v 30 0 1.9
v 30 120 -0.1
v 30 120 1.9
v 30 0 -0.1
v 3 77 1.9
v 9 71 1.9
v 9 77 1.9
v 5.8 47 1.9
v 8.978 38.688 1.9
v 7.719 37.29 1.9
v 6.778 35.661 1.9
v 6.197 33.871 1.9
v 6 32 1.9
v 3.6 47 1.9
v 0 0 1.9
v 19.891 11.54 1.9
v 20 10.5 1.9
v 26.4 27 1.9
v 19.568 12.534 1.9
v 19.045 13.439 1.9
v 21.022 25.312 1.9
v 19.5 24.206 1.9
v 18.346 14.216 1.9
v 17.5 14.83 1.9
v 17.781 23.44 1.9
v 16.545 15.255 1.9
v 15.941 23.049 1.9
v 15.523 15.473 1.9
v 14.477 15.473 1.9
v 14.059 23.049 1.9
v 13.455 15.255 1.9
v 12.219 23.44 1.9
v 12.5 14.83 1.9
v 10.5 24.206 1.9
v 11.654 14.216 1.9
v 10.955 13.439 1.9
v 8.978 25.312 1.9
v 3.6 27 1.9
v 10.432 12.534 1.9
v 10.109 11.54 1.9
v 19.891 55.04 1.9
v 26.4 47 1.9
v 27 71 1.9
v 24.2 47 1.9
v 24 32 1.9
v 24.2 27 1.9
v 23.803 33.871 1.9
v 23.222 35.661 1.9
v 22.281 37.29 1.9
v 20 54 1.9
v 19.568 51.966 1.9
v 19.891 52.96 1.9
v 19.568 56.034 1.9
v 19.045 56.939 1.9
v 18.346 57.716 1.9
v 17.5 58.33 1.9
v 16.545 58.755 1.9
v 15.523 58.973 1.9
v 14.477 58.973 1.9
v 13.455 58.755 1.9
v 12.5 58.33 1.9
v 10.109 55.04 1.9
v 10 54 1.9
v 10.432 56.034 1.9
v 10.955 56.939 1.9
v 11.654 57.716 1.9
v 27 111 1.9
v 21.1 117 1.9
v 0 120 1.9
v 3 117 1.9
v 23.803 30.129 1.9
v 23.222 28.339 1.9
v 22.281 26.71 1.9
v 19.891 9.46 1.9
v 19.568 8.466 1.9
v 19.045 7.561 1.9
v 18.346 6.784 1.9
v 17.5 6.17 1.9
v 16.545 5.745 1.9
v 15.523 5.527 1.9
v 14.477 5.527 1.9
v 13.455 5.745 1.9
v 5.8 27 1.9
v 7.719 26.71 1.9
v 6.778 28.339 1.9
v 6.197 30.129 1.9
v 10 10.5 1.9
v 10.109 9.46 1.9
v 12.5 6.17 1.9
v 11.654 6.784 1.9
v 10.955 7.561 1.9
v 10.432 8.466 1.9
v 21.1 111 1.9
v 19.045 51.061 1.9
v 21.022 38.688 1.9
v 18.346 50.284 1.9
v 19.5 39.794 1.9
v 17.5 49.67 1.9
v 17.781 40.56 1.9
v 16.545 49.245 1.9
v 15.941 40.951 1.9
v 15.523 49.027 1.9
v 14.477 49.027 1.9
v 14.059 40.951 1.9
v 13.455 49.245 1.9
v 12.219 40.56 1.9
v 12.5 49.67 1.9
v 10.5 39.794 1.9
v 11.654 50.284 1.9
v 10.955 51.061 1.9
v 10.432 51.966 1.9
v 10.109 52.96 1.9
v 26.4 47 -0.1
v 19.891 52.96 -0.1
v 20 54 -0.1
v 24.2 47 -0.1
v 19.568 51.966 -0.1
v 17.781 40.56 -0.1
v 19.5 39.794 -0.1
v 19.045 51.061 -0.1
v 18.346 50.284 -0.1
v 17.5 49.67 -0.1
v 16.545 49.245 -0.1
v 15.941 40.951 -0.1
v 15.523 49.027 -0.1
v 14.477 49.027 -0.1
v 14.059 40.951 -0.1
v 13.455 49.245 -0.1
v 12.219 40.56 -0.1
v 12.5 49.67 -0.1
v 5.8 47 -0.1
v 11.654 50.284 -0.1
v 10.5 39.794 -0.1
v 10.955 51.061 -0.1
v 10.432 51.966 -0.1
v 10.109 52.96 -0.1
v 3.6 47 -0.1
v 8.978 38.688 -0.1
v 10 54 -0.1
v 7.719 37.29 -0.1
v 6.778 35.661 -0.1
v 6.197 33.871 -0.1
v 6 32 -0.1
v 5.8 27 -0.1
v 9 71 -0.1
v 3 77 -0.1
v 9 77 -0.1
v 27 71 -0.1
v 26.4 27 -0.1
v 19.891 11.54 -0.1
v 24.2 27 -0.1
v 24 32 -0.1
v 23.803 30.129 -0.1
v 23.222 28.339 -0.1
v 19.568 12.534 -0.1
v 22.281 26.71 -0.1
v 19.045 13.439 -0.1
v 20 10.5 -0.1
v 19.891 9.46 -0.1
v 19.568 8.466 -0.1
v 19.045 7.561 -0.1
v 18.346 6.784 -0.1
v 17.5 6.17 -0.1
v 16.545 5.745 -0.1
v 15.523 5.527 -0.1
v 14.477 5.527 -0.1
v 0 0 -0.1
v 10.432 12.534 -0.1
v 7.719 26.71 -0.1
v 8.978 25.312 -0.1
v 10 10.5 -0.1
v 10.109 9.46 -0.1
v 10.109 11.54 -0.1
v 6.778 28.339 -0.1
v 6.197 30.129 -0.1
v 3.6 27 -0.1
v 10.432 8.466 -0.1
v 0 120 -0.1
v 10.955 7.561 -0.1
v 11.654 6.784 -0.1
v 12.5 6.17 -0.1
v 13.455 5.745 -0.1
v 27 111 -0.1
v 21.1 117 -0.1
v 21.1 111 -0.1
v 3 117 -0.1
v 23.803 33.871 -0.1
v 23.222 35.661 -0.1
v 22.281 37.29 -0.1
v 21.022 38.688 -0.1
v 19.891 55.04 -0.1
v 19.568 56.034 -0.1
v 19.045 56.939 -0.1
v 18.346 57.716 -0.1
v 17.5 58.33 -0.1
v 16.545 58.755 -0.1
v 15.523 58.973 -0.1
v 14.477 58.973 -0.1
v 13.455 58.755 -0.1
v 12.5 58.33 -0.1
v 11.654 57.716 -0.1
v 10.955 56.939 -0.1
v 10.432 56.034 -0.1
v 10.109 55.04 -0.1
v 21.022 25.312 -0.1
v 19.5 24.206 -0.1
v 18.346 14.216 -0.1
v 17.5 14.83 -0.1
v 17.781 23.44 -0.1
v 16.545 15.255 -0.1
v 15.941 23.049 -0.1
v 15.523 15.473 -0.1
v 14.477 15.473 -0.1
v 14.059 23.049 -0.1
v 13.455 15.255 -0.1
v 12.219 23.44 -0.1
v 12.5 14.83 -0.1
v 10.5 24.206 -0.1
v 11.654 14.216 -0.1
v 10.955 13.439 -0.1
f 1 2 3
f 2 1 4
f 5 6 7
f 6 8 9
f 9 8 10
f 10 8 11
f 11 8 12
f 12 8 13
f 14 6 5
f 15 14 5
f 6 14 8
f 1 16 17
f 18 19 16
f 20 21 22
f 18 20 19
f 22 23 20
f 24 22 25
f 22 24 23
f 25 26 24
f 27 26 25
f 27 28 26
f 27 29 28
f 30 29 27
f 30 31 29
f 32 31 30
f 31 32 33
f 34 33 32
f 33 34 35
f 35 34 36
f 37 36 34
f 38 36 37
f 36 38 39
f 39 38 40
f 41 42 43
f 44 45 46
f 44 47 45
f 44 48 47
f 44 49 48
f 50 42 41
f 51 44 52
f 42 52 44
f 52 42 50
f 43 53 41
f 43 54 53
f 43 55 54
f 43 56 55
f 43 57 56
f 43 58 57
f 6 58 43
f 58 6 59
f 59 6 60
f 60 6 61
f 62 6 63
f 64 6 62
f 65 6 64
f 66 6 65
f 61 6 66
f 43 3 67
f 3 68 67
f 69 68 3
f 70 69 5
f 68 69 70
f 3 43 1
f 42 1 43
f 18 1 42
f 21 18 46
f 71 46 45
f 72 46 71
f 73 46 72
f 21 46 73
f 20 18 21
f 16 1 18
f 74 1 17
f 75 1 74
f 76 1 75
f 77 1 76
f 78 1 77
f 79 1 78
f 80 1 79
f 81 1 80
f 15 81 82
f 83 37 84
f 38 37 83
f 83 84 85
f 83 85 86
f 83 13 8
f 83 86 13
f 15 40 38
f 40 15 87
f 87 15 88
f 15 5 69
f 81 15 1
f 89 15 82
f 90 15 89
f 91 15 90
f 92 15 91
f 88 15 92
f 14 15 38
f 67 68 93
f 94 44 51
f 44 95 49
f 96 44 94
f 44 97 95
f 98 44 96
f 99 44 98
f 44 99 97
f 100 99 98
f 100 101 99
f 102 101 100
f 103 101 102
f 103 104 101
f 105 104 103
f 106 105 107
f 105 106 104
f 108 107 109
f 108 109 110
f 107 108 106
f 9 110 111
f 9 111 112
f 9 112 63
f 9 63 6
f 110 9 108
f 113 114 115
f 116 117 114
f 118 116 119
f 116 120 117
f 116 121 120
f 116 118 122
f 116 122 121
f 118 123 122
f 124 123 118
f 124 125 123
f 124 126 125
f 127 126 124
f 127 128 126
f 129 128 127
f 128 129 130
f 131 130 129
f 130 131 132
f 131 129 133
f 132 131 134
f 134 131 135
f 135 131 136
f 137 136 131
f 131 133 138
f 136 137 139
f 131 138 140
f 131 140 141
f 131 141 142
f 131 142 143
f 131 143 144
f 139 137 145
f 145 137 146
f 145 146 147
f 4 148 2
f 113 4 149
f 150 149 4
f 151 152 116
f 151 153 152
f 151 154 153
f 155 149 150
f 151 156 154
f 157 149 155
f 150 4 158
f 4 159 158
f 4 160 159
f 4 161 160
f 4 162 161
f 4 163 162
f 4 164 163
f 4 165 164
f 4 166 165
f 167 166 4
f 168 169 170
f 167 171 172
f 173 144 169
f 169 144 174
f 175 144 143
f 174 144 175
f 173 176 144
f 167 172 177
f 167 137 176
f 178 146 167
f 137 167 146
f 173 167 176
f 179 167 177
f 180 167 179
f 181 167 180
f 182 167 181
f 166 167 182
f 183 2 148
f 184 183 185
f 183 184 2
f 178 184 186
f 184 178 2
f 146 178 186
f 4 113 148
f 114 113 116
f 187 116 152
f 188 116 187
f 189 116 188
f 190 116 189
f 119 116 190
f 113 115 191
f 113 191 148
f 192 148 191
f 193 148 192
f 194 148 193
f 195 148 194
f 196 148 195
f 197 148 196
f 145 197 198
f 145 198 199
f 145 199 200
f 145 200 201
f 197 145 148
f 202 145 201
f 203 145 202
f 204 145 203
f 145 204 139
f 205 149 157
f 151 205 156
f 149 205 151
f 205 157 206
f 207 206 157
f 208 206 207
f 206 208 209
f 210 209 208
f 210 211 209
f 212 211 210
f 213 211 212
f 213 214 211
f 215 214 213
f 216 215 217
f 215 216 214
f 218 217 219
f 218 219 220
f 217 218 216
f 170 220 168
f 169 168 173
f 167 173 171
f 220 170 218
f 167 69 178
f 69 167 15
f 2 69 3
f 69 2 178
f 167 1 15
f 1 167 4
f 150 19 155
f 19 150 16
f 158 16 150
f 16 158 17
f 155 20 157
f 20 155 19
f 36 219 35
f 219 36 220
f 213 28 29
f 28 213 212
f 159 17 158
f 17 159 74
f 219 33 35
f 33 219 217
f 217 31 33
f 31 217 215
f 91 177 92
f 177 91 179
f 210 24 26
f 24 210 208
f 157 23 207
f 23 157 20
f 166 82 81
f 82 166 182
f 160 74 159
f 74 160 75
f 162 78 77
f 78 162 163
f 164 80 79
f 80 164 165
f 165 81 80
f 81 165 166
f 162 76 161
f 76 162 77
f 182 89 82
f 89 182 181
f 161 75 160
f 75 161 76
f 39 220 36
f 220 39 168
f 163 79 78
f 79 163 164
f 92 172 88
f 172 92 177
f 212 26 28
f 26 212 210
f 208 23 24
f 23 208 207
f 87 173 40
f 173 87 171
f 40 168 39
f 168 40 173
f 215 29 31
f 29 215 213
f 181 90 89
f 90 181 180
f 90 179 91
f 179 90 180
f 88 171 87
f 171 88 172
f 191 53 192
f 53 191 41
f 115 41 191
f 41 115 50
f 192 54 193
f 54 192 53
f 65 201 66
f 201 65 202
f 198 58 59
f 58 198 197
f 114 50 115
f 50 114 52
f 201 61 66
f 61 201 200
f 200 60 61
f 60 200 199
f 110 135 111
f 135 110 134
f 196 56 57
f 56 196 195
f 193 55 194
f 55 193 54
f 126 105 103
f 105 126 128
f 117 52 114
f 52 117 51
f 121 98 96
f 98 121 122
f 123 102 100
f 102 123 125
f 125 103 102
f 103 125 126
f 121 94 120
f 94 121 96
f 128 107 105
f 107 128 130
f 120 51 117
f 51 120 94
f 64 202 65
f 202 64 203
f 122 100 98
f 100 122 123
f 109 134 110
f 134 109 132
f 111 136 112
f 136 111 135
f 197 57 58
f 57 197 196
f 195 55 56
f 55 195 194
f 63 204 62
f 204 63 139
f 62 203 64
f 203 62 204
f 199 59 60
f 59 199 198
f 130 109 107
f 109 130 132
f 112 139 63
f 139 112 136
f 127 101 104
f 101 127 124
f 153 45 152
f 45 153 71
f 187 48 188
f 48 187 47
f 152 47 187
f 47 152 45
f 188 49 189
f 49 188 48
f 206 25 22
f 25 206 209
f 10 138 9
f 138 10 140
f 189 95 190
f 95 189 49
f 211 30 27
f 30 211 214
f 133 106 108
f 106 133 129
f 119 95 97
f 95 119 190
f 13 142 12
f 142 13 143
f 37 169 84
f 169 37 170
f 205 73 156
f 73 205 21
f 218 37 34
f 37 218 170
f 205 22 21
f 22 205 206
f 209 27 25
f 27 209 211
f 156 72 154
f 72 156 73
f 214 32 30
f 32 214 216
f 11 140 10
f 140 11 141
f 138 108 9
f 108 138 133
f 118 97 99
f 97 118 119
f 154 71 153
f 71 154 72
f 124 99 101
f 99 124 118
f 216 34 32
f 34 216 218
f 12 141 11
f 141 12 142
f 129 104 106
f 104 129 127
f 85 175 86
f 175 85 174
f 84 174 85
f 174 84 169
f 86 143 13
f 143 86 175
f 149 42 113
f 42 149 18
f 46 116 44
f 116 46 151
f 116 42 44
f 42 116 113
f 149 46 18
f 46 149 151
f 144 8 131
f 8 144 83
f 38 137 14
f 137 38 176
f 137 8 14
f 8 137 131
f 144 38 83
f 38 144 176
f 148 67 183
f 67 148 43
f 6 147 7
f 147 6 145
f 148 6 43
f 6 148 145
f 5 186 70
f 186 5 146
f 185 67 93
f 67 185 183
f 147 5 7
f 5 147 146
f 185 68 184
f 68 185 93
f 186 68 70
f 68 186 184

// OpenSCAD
// variables
Grundplatte=1;
Grundplatte_Platinenaussparung=0;
Grundplatte_Kabelschacht=0;
Deckel=0;
Deckel_CR2032=0;

// Maße Grundplatte
pH=20;  // gesamt
kH=6;   // kabel

//
module roundedEdge(x=0, y=0, z=-1, a=0, l=30, h=pH+2, s=0) 
{
    fa=5;
    fs=0.1;

    translate([x, y, z]) rotate(a)
    difference() {
        translate([0, 0, 0])
        linear_extrude(h) 
        polygon([[-1, -1], [l/2, -1], [-1, l/2]]);
        if (s==0) {
            translate([l/2, l/2, 0]) cylinder(r=l/2, h=h+2, $fa = fa, $fs = fs);
        } else if (s==1)
        {
            translate([l/2, l/2, l/2]) cylinder(r=l/2, h=h+2, $fa = fa, $fs = fs);
            translate([l/2, l/2, l/2]) 
            sphere(r=l/2, $fa = fa, $fs = fs);
        } else if (s==2) {
            translate([l/2, l/2, 0]) cylinder(r=l/2, h=h+2-l/2, $fa = fa, $fs = fs);
            translate([l/2, l/2, h-l/2]) 
            sphere(r=l/2, $fa = fa, $fs = fs);
        } else {
            translate([l/2, l/2, l/2]) cylinder(r=l/2, h=h+2-l, $fa = fa, $fs = fs);
            translate([l/2, l/2, l/2]) 
            sphere(r=l/2, $fa = fa, $fs = fs);
            translate([l/2, l/2, h-l/2]) 
            sphere(r=l/2, $fa = fa, $fs = fs);
        }
    }
}

// Grundplatte
if (Grundplatte == 1) {
    scale([0.1, 0.1, 0.1])
    difference() {
    translate([0, 0, -1])
    cube([300, 1200, pH], center=false);

    // befestigung
    translate([150, 105, -1])
    cylinder(r=50, h=pH+2, center=false);
    translate([150, 540, -1])
    cylinder(r=50, h=pH+2, center=false);
    // vierkant
    translate([150, 320, -1])
    cylinder(r=90, h=pH+2, center=false);
    // reed
    translate([242, 270, -1])
    cube([22, 200, pH+2], center=false);
    translate([36, 270, -1])
    cube([22, 200, pH+2], center=false);

    // platine
    if (Grundplatte_Platinenaussparung == 1) {
        translate([30, 710, 14])
        cube([61, 61, 7], center=false);
        translate([50, 730, 6])
        cube([41, 41, 15], center=false);
    }
    translate([90, 710, -1])
    cube([180, 61, pH+2], center=false);

    translate([30, 770, -1])
    cube([240, 340, pH+2], center=false);

    if (Grundplatte_Platinenaussparung == 1) {
        translate([210, 1109, 14])
        cube([61, 61, 7], center=false);
        translate([210, 1109, 6])
        cube([41, 41, 15], center=false);
    }
    translate([30, 1109, -1])
    cube([181, 61, pH+2], center=false);

    if (Grundplatte_Kabelschacht == 1) {
        // kabel
        translate([250, 469, -1])
        cube([kH, 242, kH], center=false);
        translate([46, 469, -1])
        cube([210, kH, kH], center=false);
        roundedEdge(x=251, y=474, h=6, a=90);

        // antenne    
        translate([25, 355, -1])
        cube([kH, 422, kH], center=false);

        roundedEdge(l=50);
        roundedEdge(x=300, y=-1, a=90, l=50);
        roundedEdge(x=301, y=1200, a=180, l=50);
        roundedEdge(y=1201, a=270, l=50);
        }
    }

}

// Deckel
if (Deckel == 1) {
    dH=80;  // gesamt

    scale([0.1, 0.1, 0.1])
    translate([0, 0, -1])
    union() {
        difference() {
            translate([400, 680, 0])
            cube([300, 520, dH], center=false);

            translate([430, 710, 11])
            cube([240, 460, dH+2], center=false);

            roundedEdge(x=400, y=1200, a=270, h=dH+2, l=50, s=1);
            roundedEdge(x=700, y=1200, a=180, h=dH+2, l=50, s=1);
                
            translate([700, 1200, 0]) rotate([90, 0, 270]) roundedEdge(x=0, y=0, h=302, l=50, s=3);
            translate([400, 680, 0]) rotate([90, 270, 180]) roundedEdge(x=0, y=0, h=522, l=50, s=2);
            translate([700, 680, 0]) rotate([90, 0, 180]) roundedEdge(x=0, y=0, h=522, l=50, s=2);
        }

        translate([420, 710, 10])
        cube([260, 30, dH-20], center=false);
        difference() {
            translate([490, 720, 0])
            cube([120, 20, dH+2+18], center=false);
            roundedEdge(x=490, y=720, z=dH-18, a=0, h=dH+2+18, l=20);
            roundedEdge(x=490+120, y=720, z=dH-18, a=90, h=dH+2+18, l=20);
        }
        translate([420, 1140, 10])
        cube([260, 30, dH-20], center=false);
        difference() {
            translate([490, 1140, 0])
            cube([120, 20, dH+2+18], center=false);
            roundedEdge(x=490, y=1140+20, z=dH-18, a=270, h=dH+2+18, l=20);
            roundedEdge(x=490+120, y=1140+20, z=dH-18, a=180, h=dH+2+18, l=20);
        }
        
        if (Deckel_CR2032 == 1) {
            difference() {
                translate([430, 880, 0])
                cube([240, 120, dH-20], center=false);
                translate([550, 940, 0])
                cylinder(r=100, h=dH-18, $fa = 5, $fs = 0.1);
            }
        }
    }
}
